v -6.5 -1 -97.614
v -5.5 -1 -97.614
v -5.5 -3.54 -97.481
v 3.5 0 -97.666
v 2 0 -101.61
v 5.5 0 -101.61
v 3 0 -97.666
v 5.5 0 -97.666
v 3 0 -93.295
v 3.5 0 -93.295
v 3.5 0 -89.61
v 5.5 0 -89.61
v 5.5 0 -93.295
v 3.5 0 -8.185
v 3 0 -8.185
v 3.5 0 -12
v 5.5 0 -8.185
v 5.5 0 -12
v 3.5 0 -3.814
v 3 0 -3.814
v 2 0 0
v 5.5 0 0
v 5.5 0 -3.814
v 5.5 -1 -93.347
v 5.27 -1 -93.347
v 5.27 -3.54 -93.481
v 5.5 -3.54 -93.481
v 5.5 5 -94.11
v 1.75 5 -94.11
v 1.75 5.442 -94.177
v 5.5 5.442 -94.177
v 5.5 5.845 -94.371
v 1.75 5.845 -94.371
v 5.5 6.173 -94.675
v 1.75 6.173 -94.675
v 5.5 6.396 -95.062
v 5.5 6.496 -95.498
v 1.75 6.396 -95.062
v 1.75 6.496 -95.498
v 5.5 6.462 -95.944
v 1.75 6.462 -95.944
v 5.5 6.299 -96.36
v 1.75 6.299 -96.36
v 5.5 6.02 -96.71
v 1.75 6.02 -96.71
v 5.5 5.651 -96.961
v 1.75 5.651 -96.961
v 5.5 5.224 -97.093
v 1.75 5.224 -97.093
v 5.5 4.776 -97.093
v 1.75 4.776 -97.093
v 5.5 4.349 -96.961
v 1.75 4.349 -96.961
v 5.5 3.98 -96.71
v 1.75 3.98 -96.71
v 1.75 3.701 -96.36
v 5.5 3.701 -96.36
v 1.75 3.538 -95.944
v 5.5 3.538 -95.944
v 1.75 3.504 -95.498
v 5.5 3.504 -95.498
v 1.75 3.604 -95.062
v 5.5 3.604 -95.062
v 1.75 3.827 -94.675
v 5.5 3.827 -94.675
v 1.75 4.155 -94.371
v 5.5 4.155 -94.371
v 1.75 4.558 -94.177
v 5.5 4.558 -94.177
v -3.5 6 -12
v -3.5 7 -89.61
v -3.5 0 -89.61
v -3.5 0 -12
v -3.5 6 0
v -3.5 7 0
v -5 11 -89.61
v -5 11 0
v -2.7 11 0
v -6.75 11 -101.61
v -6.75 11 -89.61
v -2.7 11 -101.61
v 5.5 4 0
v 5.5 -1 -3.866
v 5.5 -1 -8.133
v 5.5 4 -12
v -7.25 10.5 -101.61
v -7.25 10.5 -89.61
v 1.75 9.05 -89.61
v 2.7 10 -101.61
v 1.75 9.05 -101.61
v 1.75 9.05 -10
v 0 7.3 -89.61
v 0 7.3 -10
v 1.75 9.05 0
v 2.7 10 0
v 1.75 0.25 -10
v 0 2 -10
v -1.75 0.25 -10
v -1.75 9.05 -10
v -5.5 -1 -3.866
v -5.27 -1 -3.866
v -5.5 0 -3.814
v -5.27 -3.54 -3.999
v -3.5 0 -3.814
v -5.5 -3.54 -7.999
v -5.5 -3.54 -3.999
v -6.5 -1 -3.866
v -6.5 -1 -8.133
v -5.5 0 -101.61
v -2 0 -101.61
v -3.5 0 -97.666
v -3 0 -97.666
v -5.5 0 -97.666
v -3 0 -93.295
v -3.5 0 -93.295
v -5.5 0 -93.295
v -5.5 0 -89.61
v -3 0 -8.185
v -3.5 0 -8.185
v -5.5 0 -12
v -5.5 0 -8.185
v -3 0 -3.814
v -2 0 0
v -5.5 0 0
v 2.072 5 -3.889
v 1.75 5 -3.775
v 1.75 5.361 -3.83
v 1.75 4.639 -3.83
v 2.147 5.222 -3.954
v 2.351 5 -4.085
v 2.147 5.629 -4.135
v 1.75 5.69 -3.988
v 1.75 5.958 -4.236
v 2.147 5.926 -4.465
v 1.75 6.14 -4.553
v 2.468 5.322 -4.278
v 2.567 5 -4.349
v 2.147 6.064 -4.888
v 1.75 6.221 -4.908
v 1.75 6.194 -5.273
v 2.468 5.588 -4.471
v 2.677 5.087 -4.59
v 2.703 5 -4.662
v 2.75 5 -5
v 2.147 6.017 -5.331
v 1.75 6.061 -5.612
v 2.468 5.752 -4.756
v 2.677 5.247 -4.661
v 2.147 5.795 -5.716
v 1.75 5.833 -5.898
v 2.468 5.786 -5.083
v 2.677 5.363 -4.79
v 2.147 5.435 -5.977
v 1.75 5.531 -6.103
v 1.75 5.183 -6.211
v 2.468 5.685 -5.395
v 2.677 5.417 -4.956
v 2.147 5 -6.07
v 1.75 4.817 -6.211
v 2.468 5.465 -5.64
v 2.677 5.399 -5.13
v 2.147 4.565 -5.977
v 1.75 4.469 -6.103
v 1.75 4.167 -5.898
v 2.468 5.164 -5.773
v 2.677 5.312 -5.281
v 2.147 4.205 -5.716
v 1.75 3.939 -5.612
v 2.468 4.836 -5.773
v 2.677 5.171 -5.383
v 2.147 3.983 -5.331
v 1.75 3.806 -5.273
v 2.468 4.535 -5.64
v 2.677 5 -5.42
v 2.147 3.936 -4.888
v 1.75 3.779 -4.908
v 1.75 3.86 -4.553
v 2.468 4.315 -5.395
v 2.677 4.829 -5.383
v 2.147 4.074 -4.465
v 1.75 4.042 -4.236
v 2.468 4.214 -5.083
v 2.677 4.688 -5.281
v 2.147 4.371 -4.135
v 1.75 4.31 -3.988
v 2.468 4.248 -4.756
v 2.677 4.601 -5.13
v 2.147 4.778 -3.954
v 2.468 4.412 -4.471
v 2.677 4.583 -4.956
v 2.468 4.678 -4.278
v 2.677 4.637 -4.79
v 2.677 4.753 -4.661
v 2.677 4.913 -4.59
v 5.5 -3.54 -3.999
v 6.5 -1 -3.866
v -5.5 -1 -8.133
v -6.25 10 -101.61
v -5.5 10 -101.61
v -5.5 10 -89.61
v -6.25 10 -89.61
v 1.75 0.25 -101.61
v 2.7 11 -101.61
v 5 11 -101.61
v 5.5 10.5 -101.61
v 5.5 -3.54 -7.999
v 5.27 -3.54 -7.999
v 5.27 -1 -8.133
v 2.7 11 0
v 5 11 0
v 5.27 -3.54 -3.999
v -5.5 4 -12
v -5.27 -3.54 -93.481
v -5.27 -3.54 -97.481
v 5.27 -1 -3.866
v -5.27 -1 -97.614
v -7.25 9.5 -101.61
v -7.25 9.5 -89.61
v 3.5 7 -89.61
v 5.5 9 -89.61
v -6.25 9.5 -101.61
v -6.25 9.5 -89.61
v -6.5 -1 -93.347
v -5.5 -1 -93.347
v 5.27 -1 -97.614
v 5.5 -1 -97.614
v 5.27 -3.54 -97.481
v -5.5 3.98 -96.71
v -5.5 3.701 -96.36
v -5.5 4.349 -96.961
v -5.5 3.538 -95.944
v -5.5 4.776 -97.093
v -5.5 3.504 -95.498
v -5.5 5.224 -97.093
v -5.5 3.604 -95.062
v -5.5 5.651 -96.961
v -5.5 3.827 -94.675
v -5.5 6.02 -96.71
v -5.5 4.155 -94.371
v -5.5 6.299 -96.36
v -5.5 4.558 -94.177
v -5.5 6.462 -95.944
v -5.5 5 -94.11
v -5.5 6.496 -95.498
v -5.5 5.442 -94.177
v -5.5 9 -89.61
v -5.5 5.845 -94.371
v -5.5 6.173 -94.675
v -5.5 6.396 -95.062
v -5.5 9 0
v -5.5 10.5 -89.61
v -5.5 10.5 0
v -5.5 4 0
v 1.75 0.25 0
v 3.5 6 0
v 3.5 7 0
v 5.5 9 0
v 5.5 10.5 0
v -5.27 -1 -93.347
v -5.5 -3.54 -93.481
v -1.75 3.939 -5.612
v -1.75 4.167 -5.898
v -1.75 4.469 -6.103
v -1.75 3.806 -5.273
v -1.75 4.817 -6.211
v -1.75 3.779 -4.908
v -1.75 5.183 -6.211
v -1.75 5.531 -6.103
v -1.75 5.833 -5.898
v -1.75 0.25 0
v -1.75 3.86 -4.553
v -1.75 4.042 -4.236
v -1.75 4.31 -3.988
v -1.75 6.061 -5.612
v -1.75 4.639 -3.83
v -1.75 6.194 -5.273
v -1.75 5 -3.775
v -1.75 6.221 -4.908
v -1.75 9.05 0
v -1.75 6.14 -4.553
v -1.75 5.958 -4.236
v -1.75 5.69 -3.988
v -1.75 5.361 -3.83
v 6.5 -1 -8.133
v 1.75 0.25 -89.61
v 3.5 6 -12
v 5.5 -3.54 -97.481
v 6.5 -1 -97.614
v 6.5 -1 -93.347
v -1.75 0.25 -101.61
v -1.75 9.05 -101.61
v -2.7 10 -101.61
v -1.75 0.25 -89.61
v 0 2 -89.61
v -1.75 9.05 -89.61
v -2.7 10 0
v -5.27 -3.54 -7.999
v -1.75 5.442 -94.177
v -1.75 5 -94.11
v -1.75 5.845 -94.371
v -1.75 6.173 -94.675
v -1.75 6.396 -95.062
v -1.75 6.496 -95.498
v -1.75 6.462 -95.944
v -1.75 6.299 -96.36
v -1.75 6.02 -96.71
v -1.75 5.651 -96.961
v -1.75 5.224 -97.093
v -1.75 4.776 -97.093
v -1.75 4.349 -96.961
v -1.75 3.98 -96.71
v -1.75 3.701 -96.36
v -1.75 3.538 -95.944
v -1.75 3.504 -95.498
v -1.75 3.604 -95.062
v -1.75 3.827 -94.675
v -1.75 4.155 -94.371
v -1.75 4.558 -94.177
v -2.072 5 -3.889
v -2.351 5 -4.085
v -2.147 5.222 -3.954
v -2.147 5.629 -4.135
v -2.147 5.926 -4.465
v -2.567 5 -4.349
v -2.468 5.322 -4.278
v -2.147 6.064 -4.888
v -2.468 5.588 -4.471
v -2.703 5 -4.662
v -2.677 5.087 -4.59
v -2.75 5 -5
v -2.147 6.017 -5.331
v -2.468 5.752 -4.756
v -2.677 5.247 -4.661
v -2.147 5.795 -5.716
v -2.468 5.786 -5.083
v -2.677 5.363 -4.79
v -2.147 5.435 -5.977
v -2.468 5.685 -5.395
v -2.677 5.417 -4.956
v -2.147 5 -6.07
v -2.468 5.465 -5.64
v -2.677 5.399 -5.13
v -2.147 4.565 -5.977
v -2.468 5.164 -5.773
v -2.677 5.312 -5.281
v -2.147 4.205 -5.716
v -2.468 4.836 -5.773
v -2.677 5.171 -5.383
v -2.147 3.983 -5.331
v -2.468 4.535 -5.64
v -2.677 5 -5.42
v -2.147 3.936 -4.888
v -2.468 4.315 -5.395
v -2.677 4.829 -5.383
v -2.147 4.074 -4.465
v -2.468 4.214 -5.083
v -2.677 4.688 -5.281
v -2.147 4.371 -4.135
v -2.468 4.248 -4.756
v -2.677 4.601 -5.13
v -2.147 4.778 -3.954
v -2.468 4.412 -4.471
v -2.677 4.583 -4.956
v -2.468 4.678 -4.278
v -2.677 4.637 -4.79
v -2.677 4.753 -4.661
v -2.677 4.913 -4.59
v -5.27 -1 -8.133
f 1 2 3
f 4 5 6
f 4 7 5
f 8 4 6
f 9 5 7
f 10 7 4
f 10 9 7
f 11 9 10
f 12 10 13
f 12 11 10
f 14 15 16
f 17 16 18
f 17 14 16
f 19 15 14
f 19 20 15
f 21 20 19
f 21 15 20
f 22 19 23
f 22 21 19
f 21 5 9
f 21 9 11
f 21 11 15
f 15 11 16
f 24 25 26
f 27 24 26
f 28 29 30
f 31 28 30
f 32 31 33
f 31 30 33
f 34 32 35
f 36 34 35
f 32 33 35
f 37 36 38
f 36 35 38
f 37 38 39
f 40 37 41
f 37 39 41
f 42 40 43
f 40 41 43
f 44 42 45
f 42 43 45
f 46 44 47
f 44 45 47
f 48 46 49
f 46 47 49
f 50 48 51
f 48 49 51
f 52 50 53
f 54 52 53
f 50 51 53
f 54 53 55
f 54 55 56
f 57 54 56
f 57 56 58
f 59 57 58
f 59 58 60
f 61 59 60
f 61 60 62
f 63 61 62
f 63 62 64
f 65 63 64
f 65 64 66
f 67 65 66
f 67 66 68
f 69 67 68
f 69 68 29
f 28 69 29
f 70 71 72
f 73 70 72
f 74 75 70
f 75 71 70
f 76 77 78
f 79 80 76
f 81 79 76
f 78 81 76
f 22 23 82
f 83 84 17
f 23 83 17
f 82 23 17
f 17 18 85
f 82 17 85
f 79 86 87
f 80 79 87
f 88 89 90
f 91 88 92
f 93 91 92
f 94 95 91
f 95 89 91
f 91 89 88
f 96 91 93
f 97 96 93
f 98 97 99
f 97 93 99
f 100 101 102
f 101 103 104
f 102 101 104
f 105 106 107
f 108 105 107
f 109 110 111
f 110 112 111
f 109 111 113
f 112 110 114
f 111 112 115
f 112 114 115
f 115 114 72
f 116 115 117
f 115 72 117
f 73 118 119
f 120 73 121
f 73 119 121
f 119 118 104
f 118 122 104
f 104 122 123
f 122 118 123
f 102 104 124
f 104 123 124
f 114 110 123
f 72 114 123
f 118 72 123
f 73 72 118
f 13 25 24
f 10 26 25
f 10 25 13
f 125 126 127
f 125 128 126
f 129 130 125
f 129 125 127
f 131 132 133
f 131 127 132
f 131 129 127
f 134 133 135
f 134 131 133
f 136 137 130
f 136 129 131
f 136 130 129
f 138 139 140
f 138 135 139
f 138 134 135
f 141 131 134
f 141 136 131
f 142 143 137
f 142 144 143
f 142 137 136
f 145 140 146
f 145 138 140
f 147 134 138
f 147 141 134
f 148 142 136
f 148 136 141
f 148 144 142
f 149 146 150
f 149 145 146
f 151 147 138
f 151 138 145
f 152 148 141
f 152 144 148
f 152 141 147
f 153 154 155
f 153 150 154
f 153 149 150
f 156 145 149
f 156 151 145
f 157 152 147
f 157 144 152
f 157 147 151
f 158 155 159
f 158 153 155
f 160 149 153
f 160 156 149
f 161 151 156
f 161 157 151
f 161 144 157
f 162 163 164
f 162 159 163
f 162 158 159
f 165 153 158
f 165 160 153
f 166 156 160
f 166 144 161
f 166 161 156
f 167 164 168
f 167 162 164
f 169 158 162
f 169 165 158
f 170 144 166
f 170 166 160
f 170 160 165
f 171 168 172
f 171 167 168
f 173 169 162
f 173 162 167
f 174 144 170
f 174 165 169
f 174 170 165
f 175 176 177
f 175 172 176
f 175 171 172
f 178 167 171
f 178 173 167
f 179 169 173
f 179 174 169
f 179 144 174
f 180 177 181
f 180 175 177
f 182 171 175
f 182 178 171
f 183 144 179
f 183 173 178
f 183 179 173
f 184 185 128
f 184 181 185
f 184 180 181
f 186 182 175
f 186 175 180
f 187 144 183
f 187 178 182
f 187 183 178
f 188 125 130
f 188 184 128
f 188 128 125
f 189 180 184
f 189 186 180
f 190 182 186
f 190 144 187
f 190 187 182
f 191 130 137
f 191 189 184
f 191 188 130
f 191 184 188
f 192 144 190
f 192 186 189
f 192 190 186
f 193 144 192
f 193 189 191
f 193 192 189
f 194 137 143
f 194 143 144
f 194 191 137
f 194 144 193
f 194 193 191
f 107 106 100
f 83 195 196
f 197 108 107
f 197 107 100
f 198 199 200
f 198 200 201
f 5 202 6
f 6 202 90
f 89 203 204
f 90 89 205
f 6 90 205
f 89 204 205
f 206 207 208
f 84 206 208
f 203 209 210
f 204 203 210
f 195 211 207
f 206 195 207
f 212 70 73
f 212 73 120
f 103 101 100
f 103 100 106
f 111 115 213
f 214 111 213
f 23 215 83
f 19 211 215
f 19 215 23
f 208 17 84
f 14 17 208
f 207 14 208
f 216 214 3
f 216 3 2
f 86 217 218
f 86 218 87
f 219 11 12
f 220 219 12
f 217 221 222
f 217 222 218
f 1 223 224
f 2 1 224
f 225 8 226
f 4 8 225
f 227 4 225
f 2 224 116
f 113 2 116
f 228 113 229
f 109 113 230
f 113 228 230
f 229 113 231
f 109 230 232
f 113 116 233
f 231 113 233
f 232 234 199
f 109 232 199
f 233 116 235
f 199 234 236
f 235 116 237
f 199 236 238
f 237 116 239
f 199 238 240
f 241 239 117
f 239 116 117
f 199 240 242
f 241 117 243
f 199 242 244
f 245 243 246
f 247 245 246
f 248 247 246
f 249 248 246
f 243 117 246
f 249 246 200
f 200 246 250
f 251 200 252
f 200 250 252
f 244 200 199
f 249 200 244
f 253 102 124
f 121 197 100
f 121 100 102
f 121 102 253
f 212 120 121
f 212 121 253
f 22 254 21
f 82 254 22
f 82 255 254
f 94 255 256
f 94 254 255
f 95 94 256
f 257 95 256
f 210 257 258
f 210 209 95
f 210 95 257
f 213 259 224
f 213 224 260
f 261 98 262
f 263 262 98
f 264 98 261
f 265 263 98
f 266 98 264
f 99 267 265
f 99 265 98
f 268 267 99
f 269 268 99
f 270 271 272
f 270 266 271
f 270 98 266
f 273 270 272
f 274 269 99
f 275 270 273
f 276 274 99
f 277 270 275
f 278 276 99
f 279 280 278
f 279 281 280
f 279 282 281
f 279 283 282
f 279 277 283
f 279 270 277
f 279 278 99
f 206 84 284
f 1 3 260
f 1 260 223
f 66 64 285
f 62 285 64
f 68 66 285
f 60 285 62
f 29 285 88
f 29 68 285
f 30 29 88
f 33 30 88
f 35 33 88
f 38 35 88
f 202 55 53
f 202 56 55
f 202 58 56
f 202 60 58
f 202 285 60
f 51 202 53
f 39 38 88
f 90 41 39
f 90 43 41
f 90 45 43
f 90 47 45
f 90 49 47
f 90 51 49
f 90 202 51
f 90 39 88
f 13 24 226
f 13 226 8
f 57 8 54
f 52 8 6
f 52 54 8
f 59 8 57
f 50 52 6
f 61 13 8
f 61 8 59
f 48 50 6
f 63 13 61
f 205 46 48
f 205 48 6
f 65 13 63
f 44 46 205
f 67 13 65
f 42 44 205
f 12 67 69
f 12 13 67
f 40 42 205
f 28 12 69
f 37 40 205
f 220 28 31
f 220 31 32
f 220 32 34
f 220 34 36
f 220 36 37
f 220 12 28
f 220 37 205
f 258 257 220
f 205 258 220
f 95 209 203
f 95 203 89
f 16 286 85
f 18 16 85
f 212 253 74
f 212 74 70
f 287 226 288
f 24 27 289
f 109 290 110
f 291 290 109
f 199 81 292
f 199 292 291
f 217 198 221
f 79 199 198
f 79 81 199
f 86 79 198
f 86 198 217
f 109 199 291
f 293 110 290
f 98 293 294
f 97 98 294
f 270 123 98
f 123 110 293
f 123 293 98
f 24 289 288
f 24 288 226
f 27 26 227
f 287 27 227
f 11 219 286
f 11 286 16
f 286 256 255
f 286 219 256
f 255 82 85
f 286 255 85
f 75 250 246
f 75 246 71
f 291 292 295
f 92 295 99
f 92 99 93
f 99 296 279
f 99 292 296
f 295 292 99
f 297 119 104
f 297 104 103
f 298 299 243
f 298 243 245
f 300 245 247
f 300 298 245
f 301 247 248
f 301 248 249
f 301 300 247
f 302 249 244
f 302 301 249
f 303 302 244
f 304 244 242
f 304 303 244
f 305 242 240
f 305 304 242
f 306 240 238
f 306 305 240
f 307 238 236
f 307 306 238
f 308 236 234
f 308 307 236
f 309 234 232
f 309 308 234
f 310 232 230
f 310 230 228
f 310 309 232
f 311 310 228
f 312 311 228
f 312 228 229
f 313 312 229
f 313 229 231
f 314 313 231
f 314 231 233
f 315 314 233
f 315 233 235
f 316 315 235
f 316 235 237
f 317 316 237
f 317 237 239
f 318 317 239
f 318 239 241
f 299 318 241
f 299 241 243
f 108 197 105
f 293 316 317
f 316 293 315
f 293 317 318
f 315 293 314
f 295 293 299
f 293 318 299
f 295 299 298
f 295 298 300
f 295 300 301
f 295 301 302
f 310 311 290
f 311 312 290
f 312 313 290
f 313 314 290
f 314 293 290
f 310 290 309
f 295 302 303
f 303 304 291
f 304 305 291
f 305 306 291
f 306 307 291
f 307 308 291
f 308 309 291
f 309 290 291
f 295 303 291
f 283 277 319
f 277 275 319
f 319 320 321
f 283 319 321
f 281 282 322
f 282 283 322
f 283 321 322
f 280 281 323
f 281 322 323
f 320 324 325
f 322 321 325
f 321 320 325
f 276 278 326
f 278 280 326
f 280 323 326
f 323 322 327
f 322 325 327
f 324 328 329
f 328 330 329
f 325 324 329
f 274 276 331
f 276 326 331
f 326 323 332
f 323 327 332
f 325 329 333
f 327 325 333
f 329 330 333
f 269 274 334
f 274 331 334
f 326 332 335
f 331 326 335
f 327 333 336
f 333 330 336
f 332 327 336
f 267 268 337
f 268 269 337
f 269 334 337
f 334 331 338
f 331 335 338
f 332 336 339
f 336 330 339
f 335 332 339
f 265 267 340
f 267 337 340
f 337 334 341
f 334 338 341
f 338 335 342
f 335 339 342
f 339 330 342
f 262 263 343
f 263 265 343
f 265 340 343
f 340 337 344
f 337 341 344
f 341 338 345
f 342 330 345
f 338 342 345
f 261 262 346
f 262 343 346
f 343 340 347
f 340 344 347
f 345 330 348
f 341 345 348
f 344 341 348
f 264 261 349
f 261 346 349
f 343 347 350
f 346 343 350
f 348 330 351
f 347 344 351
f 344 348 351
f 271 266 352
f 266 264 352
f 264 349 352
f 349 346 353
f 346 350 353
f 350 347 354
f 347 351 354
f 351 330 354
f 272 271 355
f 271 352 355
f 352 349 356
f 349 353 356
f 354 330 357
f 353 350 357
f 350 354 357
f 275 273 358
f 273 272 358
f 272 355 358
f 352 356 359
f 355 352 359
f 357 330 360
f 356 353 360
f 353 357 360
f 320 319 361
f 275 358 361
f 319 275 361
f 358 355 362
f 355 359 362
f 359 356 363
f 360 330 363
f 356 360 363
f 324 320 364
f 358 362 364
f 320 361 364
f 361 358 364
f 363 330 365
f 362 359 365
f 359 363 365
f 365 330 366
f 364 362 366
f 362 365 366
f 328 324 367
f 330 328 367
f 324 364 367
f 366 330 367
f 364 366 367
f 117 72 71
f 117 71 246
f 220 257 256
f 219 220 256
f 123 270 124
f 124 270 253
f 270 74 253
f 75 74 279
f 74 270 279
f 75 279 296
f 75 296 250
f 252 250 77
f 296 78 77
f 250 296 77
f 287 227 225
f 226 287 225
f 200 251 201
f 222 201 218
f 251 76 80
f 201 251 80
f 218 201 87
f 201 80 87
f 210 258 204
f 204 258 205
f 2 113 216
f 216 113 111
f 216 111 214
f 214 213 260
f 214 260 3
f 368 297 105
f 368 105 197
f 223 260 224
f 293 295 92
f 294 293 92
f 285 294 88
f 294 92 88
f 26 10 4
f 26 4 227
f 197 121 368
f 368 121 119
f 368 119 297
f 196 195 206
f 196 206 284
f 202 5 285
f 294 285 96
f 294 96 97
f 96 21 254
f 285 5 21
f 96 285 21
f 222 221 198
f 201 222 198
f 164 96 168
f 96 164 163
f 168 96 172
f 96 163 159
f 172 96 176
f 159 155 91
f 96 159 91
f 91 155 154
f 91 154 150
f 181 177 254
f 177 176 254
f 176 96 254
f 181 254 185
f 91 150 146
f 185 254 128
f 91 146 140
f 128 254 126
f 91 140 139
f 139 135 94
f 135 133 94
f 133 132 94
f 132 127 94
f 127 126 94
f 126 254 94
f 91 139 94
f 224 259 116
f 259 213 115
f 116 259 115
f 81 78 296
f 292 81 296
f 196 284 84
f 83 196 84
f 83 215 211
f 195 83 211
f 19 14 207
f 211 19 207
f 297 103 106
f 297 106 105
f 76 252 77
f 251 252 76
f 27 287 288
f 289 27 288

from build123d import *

# Parameters (mm, degrees)
SKETCH1_W                        = 5.5
SKETCH1_H                        = 11
MAIN_BASE_DEPTH                  = 101.61
SIDE_CUT_OUT_DEPTH               = 89.61
TOP_RUBBER_BAND_CUT_OUT_DEPTH    = 103.351561297
BOTTOM_RUBBER_BAND_CUT_OUT_DEPTH = 103.351561297
SKETCH6_W                        = 1.75
SKETCH6_H                        = 11
MOTOR_PULLEY_CUT_OUT_DEPTH       = 12
SKETCH7_W                        = 1.75
SKETCH7_H                        = 11
PULLEY_CUT_OUT_DEPTH             = 10
SKETCH11_R                       = 1.5
MOTOR_SHAFT_CUT_OUT_DEPTH        = 103.272452792
SNAP_START                       = 5.27
SNAP_HOOK_DRIVEN_SIDE_DEPTH      = 0.23
SNAP_START_2                     = -97.613689555
SNAP_HOOK_DRIVEN_SIDE_2_DEPTH    = 4.266231519
SNAP_START_3                     = -97.666097334
SNAP_HOOK_DRIVEN_SIDE_3_DEPTH    = 4.371047077
SNAP_START_4                     = 3
SNAP_HOOK_DRIVEN_SIDE_4_DEPTH    = 4
SKETCH16_W                       = 2
SKETCH16_H                       = 6
SNAP_HOOK_BASE_DEPTH             = 12
SNAP_HOOK_BASE_CHAMFER_SIZE      = 2
SNAP_HOOK_GUIDE_SIDE_DEPTH       = 0.23
SNAP_START_5                     = -8.132595504
SNAP_HOOK_GUIDE_SIDE_2_DEPTH     = 4.266231519
SNAP_START_6                     = -8.185003283
SNAP_HOOK_GUIDE_SIDE_3_DEPTH     = 4.371047078
SNAP_HOOK_GUIDE_SIDE_4_DEPTH     = 4
SKETCH13_W                       = 1
SKETCH13_H                       = 0.5
BOSS_EXTRUDE3_DEPTH              = 12
RAIL_CHAMFER_SIZE                = 0.5


with BuildPart() as part:
    # Sketch1 → main_base (new body)
    with BuildSketch(Plane.XY):
        with Locations((2.75, 5.5)):
            Rectangle(SKETCH1_W, SKETCH1_H)
    extrude(amount=-MAIN_BASE_DEPTH)

    # Sketch3 → side_cut_out (cut)
    with BuildSketch(Plane.XY):
        Polygon((5.5, 9), (3.5, 7), (3.5, 0), (5.5, 0), align=None)
    extrude(amount=-SIDE_CUT_OUT_DEPTH, mode=Mode.SUBTRACT)

    # Sketch4 → top_rubber_band_cut_out (cut, through all)
    with BuildSketch(Plane.XY):
        Polygon((0, 7.3), (0, 11), (2.7, 11), (2.7, 10), align=None)
    extrude(amount=-TOP_RUBBER_BAND_CUT_OUT_DEPTH, mode=Mode.SUBTRACT)

    # Sketch5 → bottom_rubber_band_cut_out (cut, through all)
    with BuildSketch(Plane.XY):
        Polygon((2, 0), (0, 2), (0, 0), align=None)
    extrude(amount=-BOTTOM_RUBBER_BAND_CUT_OUT_DEPTH, mode=Mode.SUBTRACT)

    # Sketch6 → motor_pulley_cut_out (cut)
    with BuildSketch(Plane(origin=(0, 0, -101.61), x_dir=(-1, 0, 0), z_dir=(0, 0, -1))):
        with Locations((-0.875, 5.5)):
            Rectangle(SKETCH6_W, SKETCH6_H)
    extrude(amount=-MOTOR_PULLEY_CUT_OUT_DEPTH, mode=Mode.SUBTRACT)

    # Sketch7 → pulley_cut_out (cut)
    with BuildSketch(Plane.XY):
        with Locations((0.875, 5.5)):
            Rectangle(SKETCH7_W, SKETCH7_H)
    extrude(amount=-PULLEY_CUT_OUT_DEPTH, mode=Mode.SUBTRACT)

    # Sketch10 → half_circle_cut_out (revolve, cut)
    with BuildSketch(Plane(origin=(0, 5, 0), x_dir=(1, 0, 0), z_dir=(0, 1, 0))):
        with BuildLine():
            Line((1.5, 5), (1.5, 3.75))
            ThreePointArc((1.5, 3.75), (2.383883476, 4.116116524), (2.75, 5))
            Line((2.75, 5), (1.5, 5))
        make_face()
    revolve(axis=Axis((2.75, 5, -5), (-1, 0, 0)), mode=Mode.SUBTRACT)

    # Sketch11 → motor_shaft_cut_out (cut, through all)
    with BuildSketch(Plane.ZY.offset(-1.75)):
        with Locations((-95.61, 5)):
            Circle(SKETCH11_R)
    extrude(amount=-MOTOR_SHAFT_CUT_OUT_DEPTH, mode=Mode.SUBTRACT)



with BuildPart() as body_2:
    # Snap Hook Driven Side: read off the stored shape, not the designer's step
    # Snap Hook Driven Side outline → Snap Hook Driven Side (new body)
    with BuildSketch(Plane.YZ.offset(SNAP_START)):
        Polygon((-1, -97.613689555), (-1, -93.347458036), (-3.54, -93.480573796), (-3.54, -97.480573796), align=None)
    extrude(amount=SNAP_HOOK_DRIVEN_SIDE_DEPTH)


with BuildPart() as part_1:
    add(part.part)

    add(body_2.part)  # Snap Hook Driven Side 2 merges body 2
    # Snap Hook Driven Side 2 outline → Snap Hook Driven Side 2 (add)
    with BuildSketch(Plane.XY.offset(SNAP_START_2)):
        Polygon((5.5, 0), (3.5, 0), (5.27, -3.54), (5.27, -1), (5.5, -1), align=None)
        Polygon((6.5, -1), (5.5, -1), (5.5, -3.54), align=None)
    extrude(amount=SNAP_HOOK_DRIVEN_SIDE_2_DEPTH)

    # Snap Hook Driven Side 3 outline → Snap Hook Driven Side 3 (add)
    with BuildSketch(Plane.XY.offset(SNAP_START_3)):
        Polygon((5.5, 0), (3.5, 0), (5.27, -3.54), (5.27, -1), (5.5, -1), align=None)
    extrude(amount=SNAP_HOOK_DRIVEN_SIDE_3_DEPTH)

    # Snap Hook Driven Side 4 outline → Snap Hook Driven Side 4 (cut)
    with BuildSketch(Plane.YZ.offset(SNAP_START_4)):
        Polygon((0, -93.295050257), (-5, -93.295050257), (-5, -93.557089154), (-3.54, -93.480573796), align=None)
        Polygon((-3.54, -97.480573796), (-5, -97.404058439), (-5, -97.666097334), (0, -97.666097334), align=None)
    extrude(amount=SNAP_HOOK_DRIVEN_SIDE_4_DEPTH, mode=Mode.SUBTRACT)

    # Sketch16 → Snap Hook Base (add)
    with BuildSketch(Plane.XY):
        with Locations((4.5, 3)):
            Rectangle(SKETCH16_W, SKETCH16_H)
    extrude(amount=-SNAP_HOOK_BASE_DEPTH)

    # Snap Hook Base Chamfer
    snap_hook_base_chamfer_edges = [part_1.edges().sort_by_distance(p)[0] for p in [
        (5.5, 6, -6),
    ]]
    chamfer(snap_hook_base_chamfer_edges, length=SNAP_HOOK_BASE_CHAMFER_SIZE - 0.0001)  # a hair under: the kernel refuses the full size



with BuildPart() as body_2_2:
    # Snap Hook Guide Side: read off the stored shape, not the designer's step
    # Snap Hook Guide Side outline → Snap Hook Guide Side (new body)
    with BuildSketch(Plane.YZ.offset(SNAP_START)):
        Polygon((-1, -3.866363984), (-3.54, -3.999479744), (-3.54, -7.999479744), (-1, -8.132595504), align=None)
    extrude(amount=SNAP_HOOK_GUIDE_SIDE_DEPTH)


with BuildPart() as part_2:
    add(part_1.part)

    add(body_2_2.part)  # Snap Hook Guide Side 2 merges body 2 2
    # Snap Hook Guide Side 2 outline → Snap Hook Guide Side 2 (add)
    with BuildSketch(Plane.XY.offset(SNAP_START_5)):
        Polygon((5.27, -1), (5.5, -1), (5.5, 0), (3.5, 0), (5.27, -3.54), align=None)
        Polygon((6.5, -1), (5.5, -1), (5.5, -3.54), align=None)
    extrude(amount=SNAP_HOOK_GUIDE_SIDE_2_DEPTH)

    # Snap Hook Guide Side 3 outline → Snap Hook Guide Side 3 (add)
    with BuildSketch(Plane.XY.offset(SNAP_START_6)):
        Polygon((5.27, -1), (5.5, -1), (5.5, 0), (3.5, 0), (5.27, -3.54), align=None)
    extrude(amount=SNAP_HOOK_GUIDE_SIDE_3_DEPTH)

    # Snap Hook Guide Side 4 outline → Snap Hook Guide Side 4 (cut)
    with BuildSketch(Plane.YZ.offset(SNAP_START_4)):
        Polygon((0, -3.813956205), (-5, -3.813956205), (-5, -4.075995102), (-3.54, -3.999479744), align=None)
        Polygon((-3.54, -7.999479744), (-5, -7.922964386), (-5, -8.185003283), (0, -8.185003283), align=None)
    extrude(amount=SNAP_HOOK_GUIDE_SIDE_4_DEPTH, mode=Mode.SUBTRACT)

    # final_mirror: part across plane


with BuildPart() as part_3:
    add(part_2.part)
    add(part_2.part.mirror(Plane(origin=(0, 0, 0), x_dir=(0, 0, 1), z_dir=(1, 0, 0))))

    # Sketch13 → Boss-Extrude3 (add)
    with BuildSketch(Plane(origin=(0, 0, -101.61), x_dir=(-1, 0, 0), z_dir=(0, 0, -1))):
        Polygon((7.25, 11), (5.5, 11), (5.5, 10), (6.25, 10), (7.25, 10), align=None)
        with Locations((6.75, 9.75)):
            Rectangle(SKETCH13_W, SKETCH13_H)
    extrude(amount=-BOSS_EXTRUDE3_DEPTH)

    # rail_chamfer
    rail_chamfer_edges = [part_3.edges().sort_by_distance(p)[0] for p in [
        (-5.5, 11, -44.805),
        (-7.25, 11, -95.61),
        (5.5, 11, -50.805),
    ]]
    chamfer(rail_chamfer_edges, length=RAIL_CHAMFER_SIZE)


solid = part_3.part
